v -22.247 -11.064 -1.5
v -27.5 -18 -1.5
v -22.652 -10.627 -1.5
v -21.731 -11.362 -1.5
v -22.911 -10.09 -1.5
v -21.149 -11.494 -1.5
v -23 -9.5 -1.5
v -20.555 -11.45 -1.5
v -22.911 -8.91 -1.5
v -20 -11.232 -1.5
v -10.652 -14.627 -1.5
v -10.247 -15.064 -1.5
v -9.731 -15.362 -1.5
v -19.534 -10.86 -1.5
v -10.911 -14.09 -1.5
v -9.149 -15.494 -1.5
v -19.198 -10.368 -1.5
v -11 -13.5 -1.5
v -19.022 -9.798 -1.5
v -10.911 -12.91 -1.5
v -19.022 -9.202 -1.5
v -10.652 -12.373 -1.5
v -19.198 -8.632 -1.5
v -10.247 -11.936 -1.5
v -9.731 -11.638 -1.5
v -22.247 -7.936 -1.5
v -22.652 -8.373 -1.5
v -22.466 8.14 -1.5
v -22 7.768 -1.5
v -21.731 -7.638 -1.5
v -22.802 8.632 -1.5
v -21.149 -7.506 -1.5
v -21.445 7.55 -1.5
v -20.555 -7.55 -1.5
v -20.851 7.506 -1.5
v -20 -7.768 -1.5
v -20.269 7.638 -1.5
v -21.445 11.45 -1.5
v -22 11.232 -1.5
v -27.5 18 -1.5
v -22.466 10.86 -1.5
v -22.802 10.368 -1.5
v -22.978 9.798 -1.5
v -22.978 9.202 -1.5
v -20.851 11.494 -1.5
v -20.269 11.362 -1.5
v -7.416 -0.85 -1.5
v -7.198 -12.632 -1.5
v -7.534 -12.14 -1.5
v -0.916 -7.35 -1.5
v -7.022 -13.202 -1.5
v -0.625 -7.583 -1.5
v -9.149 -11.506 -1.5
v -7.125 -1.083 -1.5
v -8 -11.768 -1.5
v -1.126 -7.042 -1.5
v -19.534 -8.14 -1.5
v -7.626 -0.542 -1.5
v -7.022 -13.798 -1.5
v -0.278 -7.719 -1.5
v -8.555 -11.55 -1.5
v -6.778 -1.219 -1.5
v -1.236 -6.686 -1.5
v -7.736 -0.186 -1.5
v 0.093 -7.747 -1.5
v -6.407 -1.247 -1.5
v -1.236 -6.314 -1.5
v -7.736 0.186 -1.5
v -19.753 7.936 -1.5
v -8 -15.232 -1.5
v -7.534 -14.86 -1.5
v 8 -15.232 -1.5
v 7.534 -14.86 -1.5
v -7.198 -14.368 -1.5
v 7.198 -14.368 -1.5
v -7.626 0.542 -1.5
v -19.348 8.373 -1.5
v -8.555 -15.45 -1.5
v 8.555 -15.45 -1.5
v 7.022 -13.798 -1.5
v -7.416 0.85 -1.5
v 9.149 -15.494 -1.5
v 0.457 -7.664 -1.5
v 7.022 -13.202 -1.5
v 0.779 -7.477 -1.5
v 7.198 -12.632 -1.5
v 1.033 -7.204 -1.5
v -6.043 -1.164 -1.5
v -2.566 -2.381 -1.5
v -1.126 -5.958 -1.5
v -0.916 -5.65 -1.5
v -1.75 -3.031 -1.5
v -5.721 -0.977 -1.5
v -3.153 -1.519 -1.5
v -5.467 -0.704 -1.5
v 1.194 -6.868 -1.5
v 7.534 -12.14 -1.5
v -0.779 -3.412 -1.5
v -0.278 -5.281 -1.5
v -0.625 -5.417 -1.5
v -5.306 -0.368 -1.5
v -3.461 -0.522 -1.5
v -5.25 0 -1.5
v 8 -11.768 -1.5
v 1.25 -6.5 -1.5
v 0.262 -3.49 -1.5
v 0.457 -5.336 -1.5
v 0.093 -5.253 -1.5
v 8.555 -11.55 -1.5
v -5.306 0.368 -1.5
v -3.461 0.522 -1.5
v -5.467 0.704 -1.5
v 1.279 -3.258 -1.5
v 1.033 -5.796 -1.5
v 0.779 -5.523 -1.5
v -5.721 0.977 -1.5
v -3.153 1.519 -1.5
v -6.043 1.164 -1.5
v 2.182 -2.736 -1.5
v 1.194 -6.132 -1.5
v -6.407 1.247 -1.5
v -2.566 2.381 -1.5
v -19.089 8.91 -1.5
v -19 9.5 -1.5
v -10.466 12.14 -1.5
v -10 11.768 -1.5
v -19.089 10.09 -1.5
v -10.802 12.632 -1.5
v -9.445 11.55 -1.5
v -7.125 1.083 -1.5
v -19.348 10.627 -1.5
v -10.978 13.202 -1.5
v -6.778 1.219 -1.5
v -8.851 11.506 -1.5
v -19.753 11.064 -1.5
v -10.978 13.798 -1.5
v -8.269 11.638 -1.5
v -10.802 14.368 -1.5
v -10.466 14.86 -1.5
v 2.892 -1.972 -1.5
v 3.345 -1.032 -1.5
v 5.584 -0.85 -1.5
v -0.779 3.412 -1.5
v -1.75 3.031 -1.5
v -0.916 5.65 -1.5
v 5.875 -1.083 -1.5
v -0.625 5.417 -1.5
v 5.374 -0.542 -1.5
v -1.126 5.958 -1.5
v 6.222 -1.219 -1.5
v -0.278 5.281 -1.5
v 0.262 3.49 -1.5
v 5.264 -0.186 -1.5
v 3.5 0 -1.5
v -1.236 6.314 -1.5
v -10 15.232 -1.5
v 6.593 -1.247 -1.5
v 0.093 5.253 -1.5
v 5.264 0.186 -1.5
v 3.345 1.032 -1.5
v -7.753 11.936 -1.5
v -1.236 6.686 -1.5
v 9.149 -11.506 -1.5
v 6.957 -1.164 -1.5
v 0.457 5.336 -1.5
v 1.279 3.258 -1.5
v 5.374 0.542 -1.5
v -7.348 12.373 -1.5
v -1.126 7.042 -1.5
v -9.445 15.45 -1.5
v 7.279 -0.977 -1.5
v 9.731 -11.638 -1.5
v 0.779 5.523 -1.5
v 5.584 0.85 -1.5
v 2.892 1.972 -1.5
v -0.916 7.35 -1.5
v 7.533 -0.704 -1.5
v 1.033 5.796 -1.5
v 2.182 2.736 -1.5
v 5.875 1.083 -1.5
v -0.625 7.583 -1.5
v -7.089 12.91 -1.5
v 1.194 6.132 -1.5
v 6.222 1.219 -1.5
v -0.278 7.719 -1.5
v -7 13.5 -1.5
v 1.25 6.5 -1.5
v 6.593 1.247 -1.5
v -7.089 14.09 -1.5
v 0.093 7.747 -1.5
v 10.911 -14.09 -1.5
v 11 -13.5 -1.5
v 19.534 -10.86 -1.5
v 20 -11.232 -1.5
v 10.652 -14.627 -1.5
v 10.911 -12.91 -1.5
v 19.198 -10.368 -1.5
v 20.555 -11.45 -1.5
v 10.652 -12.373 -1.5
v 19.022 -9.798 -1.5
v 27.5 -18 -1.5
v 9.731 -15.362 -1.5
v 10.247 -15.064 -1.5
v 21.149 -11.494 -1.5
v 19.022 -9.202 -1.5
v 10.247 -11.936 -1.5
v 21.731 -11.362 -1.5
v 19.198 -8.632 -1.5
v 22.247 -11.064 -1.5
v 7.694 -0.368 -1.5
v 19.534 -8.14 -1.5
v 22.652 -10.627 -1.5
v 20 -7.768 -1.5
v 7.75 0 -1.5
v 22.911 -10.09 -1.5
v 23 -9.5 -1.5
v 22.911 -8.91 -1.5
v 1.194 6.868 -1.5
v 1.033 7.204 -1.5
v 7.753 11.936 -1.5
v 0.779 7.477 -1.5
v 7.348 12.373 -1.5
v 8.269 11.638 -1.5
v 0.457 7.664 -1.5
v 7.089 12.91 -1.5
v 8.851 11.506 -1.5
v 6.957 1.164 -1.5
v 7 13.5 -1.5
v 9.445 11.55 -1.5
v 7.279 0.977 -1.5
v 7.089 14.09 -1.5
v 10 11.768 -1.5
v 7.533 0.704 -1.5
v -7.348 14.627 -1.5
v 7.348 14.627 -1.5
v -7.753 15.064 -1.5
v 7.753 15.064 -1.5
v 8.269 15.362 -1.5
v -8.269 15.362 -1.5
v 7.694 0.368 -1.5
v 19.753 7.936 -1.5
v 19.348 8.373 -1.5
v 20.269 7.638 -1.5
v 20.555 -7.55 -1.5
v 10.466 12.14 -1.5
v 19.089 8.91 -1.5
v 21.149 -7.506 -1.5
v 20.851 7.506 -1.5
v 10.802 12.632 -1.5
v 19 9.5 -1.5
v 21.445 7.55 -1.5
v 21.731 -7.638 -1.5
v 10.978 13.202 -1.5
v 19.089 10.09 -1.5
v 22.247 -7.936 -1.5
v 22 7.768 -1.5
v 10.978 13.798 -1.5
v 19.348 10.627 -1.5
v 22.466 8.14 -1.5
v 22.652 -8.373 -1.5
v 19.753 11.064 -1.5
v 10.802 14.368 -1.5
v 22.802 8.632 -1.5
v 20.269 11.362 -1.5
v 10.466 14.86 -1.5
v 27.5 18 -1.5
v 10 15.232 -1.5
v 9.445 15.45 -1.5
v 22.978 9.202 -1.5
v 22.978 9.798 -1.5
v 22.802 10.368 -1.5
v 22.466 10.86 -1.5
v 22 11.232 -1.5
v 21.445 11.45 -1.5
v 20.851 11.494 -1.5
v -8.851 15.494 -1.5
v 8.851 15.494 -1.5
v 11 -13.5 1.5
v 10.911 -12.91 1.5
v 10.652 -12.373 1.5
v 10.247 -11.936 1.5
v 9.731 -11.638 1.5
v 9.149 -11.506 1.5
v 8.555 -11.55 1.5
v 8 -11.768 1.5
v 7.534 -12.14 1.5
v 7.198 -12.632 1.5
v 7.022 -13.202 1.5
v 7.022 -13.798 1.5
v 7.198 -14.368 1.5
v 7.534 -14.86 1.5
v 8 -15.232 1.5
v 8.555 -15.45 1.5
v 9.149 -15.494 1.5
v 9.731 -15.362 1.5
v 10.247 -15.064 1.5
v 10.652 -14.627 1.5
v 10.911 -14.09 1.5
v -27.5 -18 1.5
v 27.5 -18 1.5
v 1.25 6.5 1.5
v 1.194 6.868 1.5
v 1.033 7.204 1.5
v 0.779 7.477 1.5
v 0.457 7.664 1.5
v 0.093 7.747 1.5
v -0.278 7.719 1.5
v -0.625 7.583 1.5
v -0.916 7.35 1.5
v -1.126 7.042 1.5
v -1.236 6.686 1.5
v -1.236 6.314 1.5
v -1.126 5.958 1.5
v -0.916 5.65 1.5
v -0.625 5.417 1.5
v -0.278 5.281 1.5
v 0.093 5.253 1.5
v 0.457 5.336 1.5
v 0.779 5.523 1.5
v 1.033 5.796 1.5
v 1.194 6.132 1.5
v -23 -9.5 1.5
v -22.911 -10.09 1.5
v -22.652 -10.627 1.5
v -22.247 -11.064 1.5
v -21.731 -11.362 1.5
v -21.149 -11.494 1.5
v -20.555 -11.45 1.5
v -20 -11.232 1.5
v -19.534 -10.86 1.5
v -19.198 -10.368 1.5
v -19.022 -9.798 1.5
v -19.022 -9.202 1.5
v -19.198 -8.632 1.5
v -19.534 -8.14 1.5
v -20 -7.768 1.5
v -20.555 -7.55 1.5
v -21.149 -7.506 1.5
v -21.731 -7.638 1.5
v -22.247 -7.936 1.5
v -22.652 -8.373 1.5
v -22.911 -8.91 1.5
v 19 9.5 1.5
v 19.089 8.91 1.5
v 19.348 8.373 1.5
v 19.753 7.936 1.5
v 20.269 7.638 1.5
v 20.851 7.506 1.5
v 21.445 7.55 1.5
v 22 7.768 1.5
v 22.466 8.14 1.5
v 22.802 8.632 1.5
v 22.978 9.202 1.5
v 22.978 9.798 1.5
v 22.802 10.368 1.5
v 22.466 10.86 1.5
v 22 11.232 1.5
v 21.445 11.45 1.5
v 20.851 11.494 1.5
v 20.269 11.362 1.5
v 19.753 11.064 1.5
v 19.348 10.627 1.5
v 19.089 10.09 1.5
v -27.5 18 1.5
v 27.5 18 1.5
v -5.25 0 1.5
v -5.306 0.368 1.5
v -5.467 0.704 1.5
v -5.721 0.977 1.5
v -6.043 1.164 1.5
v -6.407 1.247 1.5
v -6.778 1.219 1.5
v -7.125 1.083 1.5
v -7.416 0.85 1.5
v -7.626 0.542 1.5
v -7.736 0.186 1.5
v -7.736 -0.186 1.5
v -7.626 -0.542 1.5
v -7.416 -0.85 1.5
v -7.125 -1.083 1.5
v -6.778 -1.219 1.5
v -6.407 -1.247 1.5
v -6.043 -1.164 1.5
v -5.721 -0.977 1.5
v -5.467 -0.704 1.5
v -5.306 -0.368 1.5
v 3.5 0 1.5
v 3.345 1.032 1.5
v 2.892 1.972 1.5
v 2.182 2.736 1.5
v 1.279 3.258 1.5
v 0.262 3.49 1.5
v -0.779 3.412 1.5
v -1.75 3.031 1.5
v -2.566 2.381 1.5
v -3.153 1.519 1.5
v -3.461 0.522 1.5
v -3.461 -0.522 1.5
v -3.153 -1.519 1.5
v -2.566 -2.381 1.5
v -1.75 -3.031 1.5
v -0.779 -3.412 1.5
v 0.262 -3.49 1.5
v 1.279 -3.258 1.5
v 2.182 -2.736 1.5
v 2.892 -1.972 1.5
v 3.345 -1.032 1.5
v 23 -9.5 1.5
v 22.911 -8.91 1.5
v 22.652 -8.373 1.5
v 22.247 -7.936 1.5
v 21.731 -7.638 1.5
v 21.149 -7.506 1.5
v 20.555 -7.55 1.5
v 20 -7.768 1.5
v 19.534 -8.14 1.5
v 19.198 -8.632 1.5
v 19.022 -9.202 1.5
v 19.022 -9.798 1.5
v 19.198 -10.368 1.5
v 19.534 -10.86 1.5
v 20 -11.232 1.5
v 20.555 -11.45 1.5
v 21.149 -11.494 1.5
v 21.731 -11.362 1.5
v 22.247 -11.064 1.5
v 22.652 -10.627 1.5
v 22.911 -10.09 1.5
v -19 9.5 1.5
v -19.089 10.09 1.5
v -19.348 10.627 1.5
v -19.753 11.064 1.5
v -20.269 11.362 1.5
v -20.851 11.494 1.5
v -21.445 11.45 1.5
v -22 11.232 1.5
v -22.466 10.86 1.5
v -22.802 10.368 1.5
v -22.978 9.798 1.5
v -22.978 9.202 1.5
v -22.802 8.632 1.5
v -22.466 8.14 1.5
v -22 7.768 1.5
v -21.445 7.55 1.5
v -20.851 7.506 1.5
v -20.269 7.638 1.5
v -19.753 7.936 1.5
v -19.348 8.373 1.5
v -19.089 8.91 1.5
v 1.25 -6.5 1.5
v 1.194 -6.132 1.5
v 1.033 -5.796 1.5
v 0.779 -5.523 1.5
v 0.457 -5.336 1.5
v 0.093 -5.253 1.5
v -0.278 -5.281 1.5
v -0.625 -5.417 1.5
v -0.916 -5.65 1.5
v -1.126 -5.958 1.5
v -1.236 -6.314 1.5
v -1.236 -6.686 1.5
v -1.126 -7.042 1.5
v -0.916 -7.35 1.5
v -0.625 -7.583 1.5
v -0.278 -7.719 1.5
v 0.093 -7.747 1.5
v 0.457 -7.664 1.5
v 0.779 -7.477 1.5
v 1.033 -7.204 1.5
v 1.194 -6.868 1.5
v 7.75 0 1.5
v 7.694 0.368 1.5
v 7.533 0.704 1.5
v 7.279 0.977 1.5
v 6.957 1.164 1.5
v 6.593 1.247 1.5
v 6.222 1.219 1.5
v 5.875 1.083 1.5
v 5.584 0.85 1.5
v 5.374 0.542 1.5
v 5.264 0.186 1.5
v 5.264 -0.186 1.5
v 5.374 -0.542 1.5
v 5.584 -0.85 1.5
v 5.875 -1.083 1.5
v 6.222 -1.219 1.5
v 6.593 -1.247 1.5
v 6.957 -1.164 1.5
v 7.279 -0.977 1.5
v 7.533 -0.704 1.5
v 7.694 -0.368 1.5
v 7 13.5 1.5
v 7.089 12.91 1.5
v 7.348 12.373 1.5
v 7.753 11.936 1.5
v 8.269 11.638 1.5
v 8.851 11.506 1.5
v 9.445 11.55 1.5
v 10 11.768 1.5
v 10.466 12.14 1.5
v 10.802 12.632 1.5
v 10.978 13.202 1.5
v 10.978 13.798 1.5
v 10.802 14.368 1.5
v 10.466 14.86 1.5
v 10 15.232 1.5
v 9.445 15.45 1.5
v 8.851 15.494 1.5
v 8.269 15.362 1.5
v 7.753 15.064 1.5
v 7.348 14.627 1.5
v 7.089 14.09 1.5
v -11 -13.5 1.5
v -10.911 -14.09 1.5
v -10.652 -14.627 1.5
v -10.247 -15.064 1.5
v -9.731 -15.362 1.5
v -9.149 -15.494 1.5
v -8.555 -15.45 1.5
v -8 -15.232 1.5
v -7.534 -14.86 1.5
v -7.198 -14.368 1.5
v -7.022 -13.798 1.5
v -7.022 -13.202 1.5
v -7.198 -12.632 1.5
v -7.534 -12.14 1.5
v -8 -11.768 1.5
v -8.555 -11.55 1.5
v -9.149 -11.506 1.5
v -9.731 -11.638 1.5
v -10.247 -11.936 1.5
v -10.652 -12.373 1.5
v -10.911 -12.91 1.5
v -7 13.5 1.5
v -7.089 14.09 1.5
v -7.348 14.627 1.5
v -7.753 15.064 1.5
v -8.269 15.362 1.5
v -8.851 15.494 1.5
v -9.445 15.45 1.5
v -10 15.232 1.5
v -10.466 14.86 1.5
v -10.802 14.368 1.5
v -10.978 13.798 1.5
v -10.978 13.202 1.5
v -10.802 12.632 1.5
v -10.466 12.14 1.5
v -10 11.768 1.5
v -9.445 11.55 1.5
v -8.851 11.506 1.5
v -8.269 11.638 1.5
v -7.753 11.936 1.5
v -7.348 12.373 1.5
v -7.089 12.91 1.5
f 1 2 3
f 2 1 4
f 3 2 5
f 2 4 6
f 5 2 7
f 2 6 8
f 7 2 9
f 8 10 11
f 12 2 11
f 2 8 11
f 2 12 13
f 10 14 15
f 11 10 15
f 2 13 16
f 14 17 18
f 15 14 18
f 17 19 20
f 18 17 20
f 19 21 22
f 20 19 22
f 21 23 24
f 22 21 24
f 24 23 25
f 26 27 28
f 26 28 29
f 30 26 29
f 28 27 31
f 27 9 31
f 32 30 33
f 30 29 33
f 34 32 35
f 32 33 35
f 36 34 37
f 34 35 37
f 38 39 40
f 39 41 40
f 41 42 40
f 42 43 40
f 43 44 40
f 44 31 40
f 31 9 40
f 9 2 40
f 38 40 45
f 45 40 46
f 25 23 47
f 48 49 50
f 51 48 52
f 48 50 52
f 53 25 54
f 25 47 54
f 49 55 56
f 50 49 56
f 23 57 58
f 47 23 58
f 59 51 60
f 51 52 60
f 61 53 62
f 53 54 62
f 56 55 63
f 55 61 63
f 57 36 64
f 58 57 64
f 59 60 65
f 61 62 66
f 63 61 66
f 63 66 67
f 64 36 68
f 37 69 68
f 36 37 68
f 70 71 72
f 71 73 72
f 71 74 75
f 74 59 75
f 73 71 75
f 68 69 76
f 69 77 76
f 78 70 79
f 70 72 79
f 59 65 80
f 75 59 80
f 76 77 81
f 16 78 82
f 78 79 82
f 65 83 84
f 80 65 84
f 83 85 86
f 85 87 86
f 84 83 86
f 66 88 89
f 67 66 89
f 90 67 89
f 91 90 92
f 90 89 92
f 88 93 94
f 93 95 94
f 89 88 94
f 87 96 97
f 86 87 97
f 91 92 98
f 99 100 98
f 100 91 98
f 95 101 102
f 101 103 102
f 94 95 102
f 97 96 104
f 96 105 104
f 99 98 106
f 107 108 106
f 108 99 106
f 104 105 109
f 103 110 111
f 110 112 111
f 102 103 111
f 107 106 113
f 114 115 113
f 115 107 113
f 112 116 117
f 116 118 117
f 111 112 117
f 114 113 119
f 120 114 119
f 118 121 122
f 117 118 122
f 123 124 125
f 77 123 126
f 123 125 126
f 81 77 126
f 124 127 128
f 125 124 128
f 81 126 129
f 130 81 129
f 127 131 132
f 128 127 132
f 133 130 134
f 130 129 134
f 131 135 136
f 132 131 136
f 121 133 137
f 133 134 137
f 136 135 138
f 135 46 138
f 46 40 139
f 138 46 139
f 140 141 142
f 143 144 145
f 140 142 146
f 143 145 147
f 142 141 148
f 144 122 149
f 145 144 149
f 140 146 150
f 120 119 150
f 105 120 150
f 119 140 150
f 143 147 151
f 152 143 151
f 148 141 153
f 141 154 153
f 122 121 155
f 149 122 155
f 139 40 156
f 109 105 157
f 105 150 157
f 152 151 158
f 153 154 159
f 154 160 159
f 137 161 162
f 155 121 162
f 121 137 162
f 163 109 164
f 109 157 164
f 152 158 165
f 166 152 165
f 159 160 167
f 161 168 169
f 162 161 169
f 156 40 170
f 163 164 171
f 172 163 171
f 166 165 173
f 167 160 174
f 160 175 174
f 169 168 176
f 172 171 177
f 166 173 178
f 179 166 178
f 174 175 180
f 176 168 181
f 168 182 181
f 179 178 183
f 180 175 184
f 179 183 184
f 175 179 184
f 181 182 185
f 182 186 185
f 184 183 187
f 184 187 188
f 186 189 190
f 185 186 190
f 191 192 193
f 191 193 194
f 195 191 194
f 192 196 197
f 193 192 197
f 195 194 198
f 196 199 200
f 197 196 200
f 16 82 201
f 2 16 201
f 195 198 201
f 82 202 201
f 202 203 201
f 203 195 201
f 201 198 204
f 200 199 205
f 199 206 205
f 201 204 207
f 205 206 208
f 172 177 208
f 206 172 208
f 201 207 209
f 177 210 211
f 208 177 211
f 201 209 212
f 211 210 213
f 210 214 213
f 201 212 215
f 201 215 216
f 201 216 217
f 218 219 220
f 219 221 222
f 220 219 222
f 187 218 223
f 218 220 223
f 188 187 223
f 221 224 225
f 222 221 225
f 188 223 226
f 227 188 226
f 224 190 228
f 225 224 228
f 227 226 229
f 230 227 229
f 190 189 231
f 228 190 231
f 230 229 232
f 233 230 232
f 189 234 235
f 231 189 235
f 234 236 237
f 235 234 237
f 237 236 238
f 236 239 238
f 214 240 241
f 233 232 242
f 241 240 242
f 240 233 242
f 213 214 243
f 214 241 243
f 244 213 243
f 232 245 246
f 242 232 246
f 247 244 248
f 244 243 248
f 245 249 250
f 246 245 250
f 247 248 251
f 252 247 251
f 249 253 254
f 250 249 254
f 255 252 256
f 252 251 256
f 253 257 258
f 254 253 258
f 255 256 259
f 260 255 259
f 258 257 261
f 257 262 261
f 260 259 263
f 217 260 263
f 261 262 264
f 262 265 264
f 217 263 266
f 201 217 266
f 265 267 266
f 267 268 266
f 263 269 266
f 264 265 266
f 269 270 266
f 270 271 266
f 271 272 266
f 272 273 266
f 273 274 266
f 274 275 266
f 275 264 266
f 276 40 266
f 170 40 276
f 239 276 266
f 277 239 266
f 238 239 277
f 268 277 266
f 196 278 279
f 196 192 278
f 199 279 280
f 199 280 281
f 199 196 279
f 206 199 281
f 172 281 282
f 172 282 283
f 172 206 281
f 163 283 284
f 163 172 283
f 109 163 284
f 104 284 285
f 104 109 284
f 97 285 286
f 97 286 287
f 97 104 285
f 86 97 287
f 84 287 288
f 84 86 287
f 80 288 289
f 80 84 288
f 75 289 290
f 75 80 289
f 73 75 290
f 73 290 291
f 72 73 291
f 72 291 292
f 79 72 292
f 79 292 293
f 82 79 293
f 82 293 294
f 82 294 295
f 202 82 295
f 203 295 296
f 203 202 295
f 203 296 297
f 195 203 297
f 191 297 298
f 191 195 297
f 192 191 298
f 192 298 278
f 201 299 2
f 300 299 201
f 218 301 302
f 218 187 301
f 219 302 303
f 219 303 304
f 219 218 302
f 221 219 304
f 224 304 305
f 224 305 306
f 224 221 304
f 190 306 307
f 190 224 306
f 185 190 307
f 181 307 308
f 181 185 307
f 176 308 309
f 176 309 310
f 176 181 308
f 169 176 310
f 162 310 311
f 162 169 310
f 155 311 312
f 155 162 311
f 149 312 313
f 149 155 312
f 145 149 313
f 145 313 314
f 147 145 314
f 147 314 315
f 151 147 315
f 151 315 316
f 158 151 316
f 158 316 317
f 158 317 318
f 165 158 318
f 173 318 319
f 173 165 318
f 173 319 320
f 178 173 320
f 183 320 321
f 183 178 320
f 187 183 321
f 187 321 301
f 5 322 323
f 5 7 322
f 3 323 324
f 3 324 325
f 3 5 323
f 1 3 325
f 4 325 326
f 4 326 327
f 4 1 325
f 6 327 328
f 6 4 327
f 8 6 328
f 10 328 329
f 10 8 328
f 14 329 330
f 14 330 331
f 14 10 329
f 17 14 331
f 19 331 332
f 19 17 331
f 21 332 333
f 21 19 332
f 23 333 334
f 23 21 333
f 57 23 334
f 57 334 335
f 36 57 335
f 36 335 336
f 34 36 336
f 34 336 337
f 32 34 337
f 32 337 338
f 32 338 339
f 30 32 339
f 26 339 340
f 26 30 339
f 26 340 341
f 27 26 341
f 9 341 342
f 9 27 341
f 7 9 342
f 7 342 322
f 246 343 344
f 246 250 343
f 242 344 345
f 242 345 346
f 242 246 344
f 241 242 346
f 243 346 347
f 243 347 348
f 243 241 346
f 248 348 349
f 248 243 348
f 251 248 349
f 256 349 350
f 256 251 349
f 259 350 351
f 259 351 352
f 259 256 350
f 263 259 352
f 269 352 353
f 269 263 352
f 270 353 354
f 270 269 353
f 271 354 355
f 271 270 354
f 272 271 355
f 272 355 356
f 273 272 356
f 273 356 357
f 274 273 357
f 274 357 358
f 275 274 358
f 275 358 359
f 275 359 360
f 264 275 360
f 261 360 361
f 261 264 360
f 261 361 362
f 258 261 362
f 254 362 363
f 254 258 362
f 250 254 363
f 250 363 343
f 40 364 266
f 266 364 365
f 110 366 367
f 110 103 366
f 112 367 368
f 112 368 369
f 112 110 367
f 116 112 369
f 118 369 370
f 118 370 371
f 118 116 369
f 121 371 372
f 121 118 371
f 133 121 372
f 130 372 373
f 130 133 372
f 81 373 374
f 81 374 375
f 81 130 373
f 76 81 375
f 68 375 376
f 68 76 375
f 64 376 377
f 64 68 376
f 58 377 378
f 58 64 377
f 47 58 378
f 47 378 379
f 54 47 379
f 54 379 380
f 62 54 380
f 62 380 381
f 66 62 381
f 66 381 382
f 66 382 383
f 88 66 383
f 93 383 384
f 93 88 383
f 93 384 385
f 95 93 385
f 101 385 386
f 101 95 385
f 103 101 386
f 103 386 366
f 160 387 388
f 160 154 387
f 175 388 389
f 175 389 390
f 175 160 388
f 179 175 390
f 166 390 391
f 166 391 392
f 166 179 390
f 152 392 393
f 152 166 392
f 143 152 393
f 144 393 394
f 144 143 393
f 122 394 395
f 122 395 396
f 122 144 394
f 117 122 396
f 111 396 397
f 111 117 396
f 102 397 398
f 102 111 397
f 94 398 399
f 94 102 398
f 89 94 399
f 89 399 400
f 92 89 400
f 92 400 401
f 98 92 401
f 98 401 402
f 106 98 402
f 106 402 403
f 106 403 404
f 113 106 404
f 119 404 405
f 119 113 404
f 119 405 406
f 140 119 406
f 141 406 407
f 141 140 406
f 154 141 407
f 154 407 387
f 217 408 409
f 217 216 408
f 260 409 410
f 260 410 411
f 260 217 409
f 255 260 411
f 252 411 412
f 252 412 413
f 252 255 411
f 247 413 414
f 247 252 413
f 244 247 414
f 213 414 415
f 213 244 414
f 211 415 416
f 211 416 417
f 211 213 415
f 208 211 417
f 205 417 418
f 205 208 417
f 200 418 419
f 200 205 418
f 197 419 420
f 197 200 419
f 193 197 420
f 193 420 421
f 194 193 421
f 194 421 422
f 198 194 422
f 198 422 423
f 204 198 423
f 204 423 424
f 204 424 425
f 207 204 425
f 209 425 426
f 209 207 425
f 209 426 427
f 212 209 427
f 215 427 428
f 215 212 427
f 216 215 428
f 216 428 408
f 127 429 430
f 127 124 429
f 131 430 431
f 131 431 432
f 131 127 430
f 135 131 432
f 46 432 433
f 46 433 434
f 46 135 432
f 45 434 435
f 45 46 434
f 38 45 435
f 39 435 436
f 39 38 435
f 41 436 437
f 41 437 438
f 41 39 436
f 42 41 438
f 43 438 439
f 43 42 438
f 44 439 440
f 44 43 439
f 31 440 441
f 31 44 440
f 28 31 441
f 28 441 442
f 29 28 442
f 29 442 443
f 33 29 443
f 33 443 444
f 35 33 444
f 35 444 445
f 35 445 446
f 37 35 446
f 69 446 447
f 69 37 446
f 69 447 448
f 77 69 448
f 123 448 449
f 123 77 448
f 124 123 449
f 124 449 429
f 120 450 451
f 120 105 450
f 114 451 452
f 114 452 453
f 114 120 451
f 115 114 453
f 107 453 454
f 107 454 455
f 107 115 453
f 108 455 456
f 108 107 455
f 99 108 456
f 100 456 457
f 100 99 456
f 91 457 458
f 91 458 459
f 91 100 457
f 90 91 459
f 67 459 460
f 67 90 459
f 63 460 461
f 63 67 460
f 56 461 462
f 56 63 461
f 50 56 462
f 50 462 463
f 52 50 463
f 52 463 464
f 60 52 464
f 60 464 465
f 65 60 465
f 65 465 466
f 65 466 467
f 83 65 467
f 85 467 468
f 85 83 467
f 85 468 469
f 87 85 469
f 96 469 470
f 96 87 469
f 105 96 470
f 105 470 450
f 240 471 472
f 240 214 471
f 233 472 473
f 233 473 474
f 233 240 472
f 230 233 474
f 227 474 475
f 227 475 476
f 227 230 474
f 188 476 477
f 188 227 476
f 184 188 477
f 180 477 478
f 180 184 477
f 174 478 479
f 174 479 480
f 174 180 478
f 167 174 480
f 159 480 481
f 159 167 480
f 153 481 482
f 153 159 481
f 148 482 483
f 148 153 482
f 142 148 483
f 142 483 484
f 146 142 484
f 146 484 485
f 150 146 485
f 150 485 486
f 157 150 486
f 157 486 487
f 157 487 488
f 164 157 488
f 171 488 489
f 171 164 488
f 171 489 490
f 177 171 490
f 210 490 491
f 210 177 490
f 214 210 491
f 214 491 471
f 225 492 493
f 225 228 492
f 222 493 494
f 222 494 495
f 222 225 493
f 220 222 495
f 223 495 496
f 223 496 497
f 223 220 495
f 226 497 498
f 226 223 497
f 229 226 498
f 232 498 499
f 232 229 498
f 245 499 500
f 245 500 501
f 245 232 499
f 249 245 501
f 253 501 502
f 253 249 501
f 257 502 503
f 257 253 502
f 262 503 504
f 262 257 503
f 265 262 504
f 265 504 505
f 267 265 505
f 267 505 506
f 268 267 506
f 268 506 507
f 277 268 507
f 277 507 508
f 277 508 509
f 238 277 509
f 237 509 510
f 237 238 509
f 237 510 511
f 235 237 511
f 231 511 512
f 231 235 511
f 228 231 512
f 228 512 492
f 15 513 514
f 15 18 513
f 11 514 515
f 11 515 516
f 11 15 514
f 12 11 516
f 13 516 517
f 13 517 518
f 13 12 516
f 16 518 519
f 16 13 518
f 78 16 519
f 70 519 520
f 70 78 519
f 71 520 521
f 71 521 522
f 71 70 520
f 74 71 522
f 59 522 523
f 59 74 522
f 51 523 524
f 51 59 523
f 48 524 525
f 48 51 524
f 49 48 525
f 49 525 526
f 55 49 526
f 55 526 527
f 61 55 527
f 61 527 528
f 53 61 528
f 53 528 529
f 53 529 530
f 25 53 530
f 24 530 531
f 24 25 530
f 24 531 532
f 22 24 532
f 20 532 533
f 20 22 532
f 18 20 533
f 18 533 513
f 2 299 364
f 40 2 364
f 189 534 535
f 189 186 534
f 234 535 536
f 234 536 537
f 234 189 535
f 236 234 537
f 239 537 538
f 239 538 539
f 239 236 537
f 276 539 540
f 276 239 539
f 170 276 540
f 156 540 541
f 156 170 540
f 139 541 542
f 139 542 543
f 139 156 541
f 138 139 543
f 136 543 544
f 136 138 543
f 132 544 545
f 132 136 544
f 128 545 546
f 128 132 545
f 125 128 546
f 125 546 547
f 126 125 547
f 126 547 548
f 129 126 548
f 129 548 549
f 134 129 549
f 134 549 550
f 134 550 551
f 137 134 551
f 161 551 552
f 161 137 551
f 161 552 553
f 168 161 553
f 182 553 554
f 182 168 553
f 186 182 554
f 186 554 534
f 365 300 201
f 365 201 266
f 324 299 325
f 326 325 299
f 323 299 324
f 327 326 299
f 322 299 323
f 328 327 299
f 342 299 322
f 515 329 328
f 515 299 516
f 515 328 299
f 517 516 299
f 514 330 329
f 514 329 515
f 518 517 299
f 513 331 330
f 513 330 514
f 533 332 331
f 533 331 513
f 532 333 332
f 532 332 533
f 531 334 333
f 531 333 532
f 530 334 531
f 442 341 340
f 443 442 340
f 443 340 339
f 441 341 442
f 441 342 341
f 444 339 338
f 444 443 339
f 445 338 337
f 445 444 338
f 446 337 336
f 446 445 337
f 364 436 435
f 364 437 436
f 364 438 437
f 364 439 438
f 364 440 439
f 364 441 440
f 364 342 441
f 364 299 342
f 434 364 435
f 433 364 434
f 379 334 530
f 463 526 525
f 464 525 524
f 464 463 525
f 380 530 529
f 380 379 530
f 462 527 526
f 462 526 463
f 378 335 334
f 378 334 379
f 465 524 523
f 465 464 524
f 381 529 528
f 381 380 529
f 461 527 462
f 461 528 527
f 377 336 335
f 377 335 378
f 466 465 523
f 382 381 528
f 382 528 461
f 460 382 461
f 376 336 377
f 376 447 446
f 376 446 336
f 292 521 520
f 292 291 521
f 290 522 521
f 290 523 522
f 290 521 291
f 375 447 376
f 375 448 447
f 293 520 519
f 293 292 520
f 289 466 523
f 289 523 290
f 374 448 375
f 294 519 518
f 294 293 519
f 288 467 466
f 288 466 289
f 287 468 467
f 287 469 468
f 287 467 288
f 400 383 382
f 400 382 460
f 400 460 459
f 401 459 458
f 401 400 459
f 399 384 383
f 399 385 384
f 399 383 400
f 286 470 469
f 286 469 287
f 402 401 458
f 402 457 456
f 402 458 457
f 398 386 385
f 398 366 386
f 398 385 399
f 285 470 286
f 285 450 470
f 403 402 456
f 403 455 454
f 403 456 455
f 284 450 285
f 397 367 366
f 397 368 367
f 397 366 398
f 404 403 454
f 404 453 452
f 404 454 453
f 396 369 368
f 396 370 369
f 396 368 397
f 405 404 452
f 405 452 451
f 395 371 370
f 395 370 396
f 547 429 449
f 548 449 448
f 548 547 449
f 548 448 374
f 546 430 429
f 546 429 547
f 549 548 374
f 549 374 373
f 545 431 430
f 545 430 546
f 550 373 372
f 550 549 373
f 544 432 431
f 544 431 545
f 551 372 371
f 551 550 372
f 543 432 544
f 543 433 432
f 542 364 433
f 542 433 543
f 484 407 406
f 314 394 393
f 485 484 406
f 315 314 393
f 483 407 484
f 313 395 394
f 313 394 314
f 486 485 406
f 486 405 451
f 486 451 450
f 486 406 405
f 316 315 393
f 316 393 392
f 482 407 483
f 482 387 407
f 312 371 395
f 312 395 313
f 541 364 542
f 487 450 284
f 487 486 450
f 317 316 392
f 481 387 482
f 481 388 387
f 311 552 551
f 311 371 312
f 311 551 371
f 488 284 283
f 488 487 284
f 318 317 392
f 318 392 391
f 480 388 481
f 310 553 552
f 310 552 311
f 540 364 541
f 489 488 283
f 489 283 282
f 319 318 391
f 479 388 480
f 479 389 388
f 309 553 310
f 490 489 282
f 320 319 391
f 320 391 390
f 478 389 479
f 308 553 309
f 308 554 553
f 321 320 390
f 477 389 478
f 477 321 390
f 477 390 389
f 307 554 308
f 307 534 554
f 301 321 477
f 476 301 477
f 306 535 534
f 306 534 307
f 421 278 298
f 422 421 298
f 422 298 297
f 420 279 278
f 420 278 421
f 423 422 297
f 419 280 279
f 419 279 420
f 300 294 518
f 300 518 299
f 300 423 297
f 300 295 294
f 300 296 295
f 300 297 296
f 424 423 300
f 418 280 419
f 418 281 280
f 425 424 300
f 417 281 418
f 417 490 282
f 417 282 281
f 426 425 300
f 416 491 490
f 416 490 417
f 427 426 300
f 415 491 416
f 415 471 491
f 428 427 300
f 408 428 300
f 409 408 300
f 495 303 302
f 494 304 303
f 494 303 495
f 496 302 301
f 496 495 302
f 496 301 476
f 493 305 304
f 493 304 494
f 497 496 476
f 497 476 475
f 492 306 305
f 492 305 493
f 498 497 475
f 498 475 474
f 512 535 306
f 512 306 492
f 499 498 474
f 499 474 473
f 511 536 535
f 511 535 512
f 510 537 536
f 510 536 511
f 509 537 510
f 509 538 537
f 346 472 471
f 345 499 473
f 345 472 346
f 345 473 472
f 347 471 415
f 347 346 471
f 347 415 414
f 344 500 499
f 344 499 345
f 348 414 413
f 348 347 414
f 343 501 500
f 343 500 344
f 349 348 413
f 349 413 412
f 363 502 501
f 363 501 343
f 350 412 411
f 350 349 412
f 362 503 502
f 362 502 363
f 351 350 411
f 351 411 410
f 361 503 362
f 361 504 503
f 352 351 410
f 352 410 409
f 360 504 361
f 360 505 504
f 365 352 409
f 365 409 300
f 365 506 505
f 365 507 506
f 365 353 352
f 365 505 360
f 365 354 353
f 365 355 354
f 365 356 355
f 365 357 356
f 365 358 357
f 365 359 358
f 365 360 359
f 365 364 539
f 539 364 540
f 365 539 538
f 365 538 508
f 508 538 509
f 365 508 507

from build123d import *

# Parameters (mm, degrees)
SKETCH1_W           = 55
SKETCH1_H           = 36
SKETCH1_R           = 2
SKETCH1_R_2         = 3.5
SKETCH1_R_3         = 1.25
BOSS_EXTRUDE1_DEPTH = 1.5


with BuildPart() as part:
    # Sketch1 → Boss-Extrude1 (new, symmetric)
    with BuildSketch(Plane.XY):
        Rectangle(SKETCH1_W, SKETCH1_H)
        with Locations((-9, 13.5)):
            Circle(SKETCH1_R, mode=Mode.SUBTRACT)
        with Locations((-21, 9.5)):
            Circle(SKETCH1_R, mode=Mode.SUBTRACT)
        with Locations(Location((-9, -13.5, 0), (0, 0, 180))):
            Circle(SKETCH1_R, mode=Mode.SUBTRACT)
        with Locations(Location((-21, -9.5, 0), (0, 0, 180))):
            Circle(SKETCH1_R, mode=Mode.SUBTRACT)
        with Locations((9, -13.5)):
            Circle(SKETCH1_R, mode=Mode.SUBTRACT)
        with Locations((21, -9.5)):
            Circle(SKETCH1_R, mode=Mode.SUBTRACT)
        with Locations(Location((9, 13.5, 0), (0, 0, 180))):
            Circle(SKETCH1_R, mode=Mode.SUBTRACT)
        with Locations(Location((21, 9.5, 0), (0, 0, 180))):
            Circle(SKETCH1_R, mode=Mode.SUBTRACT)
        Circle(SKETCH1_R_2, mode=Mode.SUBTRACT)
        with Locations((0, 6.5)):
            Circle(SKETCH1_R_3, mode=Mode.SUBTRACT)
        with Locations((6.5, 0)):
            Circle(SKETCH1_R_3, mode=Mode.SUBTRACT)
        with Locations((0, -6.5)):
            Circle(SKETCH1_R_3, mode=Mode.SUBTRACT)
        with Locations((-6.5, 0)):
            Circle(SKETCH1_R_3, mode=Mode.SUBTRACT)
    extrude(amount=BOSS_EXTRUDE1_DEPTH, both=True)


solid = part.part
